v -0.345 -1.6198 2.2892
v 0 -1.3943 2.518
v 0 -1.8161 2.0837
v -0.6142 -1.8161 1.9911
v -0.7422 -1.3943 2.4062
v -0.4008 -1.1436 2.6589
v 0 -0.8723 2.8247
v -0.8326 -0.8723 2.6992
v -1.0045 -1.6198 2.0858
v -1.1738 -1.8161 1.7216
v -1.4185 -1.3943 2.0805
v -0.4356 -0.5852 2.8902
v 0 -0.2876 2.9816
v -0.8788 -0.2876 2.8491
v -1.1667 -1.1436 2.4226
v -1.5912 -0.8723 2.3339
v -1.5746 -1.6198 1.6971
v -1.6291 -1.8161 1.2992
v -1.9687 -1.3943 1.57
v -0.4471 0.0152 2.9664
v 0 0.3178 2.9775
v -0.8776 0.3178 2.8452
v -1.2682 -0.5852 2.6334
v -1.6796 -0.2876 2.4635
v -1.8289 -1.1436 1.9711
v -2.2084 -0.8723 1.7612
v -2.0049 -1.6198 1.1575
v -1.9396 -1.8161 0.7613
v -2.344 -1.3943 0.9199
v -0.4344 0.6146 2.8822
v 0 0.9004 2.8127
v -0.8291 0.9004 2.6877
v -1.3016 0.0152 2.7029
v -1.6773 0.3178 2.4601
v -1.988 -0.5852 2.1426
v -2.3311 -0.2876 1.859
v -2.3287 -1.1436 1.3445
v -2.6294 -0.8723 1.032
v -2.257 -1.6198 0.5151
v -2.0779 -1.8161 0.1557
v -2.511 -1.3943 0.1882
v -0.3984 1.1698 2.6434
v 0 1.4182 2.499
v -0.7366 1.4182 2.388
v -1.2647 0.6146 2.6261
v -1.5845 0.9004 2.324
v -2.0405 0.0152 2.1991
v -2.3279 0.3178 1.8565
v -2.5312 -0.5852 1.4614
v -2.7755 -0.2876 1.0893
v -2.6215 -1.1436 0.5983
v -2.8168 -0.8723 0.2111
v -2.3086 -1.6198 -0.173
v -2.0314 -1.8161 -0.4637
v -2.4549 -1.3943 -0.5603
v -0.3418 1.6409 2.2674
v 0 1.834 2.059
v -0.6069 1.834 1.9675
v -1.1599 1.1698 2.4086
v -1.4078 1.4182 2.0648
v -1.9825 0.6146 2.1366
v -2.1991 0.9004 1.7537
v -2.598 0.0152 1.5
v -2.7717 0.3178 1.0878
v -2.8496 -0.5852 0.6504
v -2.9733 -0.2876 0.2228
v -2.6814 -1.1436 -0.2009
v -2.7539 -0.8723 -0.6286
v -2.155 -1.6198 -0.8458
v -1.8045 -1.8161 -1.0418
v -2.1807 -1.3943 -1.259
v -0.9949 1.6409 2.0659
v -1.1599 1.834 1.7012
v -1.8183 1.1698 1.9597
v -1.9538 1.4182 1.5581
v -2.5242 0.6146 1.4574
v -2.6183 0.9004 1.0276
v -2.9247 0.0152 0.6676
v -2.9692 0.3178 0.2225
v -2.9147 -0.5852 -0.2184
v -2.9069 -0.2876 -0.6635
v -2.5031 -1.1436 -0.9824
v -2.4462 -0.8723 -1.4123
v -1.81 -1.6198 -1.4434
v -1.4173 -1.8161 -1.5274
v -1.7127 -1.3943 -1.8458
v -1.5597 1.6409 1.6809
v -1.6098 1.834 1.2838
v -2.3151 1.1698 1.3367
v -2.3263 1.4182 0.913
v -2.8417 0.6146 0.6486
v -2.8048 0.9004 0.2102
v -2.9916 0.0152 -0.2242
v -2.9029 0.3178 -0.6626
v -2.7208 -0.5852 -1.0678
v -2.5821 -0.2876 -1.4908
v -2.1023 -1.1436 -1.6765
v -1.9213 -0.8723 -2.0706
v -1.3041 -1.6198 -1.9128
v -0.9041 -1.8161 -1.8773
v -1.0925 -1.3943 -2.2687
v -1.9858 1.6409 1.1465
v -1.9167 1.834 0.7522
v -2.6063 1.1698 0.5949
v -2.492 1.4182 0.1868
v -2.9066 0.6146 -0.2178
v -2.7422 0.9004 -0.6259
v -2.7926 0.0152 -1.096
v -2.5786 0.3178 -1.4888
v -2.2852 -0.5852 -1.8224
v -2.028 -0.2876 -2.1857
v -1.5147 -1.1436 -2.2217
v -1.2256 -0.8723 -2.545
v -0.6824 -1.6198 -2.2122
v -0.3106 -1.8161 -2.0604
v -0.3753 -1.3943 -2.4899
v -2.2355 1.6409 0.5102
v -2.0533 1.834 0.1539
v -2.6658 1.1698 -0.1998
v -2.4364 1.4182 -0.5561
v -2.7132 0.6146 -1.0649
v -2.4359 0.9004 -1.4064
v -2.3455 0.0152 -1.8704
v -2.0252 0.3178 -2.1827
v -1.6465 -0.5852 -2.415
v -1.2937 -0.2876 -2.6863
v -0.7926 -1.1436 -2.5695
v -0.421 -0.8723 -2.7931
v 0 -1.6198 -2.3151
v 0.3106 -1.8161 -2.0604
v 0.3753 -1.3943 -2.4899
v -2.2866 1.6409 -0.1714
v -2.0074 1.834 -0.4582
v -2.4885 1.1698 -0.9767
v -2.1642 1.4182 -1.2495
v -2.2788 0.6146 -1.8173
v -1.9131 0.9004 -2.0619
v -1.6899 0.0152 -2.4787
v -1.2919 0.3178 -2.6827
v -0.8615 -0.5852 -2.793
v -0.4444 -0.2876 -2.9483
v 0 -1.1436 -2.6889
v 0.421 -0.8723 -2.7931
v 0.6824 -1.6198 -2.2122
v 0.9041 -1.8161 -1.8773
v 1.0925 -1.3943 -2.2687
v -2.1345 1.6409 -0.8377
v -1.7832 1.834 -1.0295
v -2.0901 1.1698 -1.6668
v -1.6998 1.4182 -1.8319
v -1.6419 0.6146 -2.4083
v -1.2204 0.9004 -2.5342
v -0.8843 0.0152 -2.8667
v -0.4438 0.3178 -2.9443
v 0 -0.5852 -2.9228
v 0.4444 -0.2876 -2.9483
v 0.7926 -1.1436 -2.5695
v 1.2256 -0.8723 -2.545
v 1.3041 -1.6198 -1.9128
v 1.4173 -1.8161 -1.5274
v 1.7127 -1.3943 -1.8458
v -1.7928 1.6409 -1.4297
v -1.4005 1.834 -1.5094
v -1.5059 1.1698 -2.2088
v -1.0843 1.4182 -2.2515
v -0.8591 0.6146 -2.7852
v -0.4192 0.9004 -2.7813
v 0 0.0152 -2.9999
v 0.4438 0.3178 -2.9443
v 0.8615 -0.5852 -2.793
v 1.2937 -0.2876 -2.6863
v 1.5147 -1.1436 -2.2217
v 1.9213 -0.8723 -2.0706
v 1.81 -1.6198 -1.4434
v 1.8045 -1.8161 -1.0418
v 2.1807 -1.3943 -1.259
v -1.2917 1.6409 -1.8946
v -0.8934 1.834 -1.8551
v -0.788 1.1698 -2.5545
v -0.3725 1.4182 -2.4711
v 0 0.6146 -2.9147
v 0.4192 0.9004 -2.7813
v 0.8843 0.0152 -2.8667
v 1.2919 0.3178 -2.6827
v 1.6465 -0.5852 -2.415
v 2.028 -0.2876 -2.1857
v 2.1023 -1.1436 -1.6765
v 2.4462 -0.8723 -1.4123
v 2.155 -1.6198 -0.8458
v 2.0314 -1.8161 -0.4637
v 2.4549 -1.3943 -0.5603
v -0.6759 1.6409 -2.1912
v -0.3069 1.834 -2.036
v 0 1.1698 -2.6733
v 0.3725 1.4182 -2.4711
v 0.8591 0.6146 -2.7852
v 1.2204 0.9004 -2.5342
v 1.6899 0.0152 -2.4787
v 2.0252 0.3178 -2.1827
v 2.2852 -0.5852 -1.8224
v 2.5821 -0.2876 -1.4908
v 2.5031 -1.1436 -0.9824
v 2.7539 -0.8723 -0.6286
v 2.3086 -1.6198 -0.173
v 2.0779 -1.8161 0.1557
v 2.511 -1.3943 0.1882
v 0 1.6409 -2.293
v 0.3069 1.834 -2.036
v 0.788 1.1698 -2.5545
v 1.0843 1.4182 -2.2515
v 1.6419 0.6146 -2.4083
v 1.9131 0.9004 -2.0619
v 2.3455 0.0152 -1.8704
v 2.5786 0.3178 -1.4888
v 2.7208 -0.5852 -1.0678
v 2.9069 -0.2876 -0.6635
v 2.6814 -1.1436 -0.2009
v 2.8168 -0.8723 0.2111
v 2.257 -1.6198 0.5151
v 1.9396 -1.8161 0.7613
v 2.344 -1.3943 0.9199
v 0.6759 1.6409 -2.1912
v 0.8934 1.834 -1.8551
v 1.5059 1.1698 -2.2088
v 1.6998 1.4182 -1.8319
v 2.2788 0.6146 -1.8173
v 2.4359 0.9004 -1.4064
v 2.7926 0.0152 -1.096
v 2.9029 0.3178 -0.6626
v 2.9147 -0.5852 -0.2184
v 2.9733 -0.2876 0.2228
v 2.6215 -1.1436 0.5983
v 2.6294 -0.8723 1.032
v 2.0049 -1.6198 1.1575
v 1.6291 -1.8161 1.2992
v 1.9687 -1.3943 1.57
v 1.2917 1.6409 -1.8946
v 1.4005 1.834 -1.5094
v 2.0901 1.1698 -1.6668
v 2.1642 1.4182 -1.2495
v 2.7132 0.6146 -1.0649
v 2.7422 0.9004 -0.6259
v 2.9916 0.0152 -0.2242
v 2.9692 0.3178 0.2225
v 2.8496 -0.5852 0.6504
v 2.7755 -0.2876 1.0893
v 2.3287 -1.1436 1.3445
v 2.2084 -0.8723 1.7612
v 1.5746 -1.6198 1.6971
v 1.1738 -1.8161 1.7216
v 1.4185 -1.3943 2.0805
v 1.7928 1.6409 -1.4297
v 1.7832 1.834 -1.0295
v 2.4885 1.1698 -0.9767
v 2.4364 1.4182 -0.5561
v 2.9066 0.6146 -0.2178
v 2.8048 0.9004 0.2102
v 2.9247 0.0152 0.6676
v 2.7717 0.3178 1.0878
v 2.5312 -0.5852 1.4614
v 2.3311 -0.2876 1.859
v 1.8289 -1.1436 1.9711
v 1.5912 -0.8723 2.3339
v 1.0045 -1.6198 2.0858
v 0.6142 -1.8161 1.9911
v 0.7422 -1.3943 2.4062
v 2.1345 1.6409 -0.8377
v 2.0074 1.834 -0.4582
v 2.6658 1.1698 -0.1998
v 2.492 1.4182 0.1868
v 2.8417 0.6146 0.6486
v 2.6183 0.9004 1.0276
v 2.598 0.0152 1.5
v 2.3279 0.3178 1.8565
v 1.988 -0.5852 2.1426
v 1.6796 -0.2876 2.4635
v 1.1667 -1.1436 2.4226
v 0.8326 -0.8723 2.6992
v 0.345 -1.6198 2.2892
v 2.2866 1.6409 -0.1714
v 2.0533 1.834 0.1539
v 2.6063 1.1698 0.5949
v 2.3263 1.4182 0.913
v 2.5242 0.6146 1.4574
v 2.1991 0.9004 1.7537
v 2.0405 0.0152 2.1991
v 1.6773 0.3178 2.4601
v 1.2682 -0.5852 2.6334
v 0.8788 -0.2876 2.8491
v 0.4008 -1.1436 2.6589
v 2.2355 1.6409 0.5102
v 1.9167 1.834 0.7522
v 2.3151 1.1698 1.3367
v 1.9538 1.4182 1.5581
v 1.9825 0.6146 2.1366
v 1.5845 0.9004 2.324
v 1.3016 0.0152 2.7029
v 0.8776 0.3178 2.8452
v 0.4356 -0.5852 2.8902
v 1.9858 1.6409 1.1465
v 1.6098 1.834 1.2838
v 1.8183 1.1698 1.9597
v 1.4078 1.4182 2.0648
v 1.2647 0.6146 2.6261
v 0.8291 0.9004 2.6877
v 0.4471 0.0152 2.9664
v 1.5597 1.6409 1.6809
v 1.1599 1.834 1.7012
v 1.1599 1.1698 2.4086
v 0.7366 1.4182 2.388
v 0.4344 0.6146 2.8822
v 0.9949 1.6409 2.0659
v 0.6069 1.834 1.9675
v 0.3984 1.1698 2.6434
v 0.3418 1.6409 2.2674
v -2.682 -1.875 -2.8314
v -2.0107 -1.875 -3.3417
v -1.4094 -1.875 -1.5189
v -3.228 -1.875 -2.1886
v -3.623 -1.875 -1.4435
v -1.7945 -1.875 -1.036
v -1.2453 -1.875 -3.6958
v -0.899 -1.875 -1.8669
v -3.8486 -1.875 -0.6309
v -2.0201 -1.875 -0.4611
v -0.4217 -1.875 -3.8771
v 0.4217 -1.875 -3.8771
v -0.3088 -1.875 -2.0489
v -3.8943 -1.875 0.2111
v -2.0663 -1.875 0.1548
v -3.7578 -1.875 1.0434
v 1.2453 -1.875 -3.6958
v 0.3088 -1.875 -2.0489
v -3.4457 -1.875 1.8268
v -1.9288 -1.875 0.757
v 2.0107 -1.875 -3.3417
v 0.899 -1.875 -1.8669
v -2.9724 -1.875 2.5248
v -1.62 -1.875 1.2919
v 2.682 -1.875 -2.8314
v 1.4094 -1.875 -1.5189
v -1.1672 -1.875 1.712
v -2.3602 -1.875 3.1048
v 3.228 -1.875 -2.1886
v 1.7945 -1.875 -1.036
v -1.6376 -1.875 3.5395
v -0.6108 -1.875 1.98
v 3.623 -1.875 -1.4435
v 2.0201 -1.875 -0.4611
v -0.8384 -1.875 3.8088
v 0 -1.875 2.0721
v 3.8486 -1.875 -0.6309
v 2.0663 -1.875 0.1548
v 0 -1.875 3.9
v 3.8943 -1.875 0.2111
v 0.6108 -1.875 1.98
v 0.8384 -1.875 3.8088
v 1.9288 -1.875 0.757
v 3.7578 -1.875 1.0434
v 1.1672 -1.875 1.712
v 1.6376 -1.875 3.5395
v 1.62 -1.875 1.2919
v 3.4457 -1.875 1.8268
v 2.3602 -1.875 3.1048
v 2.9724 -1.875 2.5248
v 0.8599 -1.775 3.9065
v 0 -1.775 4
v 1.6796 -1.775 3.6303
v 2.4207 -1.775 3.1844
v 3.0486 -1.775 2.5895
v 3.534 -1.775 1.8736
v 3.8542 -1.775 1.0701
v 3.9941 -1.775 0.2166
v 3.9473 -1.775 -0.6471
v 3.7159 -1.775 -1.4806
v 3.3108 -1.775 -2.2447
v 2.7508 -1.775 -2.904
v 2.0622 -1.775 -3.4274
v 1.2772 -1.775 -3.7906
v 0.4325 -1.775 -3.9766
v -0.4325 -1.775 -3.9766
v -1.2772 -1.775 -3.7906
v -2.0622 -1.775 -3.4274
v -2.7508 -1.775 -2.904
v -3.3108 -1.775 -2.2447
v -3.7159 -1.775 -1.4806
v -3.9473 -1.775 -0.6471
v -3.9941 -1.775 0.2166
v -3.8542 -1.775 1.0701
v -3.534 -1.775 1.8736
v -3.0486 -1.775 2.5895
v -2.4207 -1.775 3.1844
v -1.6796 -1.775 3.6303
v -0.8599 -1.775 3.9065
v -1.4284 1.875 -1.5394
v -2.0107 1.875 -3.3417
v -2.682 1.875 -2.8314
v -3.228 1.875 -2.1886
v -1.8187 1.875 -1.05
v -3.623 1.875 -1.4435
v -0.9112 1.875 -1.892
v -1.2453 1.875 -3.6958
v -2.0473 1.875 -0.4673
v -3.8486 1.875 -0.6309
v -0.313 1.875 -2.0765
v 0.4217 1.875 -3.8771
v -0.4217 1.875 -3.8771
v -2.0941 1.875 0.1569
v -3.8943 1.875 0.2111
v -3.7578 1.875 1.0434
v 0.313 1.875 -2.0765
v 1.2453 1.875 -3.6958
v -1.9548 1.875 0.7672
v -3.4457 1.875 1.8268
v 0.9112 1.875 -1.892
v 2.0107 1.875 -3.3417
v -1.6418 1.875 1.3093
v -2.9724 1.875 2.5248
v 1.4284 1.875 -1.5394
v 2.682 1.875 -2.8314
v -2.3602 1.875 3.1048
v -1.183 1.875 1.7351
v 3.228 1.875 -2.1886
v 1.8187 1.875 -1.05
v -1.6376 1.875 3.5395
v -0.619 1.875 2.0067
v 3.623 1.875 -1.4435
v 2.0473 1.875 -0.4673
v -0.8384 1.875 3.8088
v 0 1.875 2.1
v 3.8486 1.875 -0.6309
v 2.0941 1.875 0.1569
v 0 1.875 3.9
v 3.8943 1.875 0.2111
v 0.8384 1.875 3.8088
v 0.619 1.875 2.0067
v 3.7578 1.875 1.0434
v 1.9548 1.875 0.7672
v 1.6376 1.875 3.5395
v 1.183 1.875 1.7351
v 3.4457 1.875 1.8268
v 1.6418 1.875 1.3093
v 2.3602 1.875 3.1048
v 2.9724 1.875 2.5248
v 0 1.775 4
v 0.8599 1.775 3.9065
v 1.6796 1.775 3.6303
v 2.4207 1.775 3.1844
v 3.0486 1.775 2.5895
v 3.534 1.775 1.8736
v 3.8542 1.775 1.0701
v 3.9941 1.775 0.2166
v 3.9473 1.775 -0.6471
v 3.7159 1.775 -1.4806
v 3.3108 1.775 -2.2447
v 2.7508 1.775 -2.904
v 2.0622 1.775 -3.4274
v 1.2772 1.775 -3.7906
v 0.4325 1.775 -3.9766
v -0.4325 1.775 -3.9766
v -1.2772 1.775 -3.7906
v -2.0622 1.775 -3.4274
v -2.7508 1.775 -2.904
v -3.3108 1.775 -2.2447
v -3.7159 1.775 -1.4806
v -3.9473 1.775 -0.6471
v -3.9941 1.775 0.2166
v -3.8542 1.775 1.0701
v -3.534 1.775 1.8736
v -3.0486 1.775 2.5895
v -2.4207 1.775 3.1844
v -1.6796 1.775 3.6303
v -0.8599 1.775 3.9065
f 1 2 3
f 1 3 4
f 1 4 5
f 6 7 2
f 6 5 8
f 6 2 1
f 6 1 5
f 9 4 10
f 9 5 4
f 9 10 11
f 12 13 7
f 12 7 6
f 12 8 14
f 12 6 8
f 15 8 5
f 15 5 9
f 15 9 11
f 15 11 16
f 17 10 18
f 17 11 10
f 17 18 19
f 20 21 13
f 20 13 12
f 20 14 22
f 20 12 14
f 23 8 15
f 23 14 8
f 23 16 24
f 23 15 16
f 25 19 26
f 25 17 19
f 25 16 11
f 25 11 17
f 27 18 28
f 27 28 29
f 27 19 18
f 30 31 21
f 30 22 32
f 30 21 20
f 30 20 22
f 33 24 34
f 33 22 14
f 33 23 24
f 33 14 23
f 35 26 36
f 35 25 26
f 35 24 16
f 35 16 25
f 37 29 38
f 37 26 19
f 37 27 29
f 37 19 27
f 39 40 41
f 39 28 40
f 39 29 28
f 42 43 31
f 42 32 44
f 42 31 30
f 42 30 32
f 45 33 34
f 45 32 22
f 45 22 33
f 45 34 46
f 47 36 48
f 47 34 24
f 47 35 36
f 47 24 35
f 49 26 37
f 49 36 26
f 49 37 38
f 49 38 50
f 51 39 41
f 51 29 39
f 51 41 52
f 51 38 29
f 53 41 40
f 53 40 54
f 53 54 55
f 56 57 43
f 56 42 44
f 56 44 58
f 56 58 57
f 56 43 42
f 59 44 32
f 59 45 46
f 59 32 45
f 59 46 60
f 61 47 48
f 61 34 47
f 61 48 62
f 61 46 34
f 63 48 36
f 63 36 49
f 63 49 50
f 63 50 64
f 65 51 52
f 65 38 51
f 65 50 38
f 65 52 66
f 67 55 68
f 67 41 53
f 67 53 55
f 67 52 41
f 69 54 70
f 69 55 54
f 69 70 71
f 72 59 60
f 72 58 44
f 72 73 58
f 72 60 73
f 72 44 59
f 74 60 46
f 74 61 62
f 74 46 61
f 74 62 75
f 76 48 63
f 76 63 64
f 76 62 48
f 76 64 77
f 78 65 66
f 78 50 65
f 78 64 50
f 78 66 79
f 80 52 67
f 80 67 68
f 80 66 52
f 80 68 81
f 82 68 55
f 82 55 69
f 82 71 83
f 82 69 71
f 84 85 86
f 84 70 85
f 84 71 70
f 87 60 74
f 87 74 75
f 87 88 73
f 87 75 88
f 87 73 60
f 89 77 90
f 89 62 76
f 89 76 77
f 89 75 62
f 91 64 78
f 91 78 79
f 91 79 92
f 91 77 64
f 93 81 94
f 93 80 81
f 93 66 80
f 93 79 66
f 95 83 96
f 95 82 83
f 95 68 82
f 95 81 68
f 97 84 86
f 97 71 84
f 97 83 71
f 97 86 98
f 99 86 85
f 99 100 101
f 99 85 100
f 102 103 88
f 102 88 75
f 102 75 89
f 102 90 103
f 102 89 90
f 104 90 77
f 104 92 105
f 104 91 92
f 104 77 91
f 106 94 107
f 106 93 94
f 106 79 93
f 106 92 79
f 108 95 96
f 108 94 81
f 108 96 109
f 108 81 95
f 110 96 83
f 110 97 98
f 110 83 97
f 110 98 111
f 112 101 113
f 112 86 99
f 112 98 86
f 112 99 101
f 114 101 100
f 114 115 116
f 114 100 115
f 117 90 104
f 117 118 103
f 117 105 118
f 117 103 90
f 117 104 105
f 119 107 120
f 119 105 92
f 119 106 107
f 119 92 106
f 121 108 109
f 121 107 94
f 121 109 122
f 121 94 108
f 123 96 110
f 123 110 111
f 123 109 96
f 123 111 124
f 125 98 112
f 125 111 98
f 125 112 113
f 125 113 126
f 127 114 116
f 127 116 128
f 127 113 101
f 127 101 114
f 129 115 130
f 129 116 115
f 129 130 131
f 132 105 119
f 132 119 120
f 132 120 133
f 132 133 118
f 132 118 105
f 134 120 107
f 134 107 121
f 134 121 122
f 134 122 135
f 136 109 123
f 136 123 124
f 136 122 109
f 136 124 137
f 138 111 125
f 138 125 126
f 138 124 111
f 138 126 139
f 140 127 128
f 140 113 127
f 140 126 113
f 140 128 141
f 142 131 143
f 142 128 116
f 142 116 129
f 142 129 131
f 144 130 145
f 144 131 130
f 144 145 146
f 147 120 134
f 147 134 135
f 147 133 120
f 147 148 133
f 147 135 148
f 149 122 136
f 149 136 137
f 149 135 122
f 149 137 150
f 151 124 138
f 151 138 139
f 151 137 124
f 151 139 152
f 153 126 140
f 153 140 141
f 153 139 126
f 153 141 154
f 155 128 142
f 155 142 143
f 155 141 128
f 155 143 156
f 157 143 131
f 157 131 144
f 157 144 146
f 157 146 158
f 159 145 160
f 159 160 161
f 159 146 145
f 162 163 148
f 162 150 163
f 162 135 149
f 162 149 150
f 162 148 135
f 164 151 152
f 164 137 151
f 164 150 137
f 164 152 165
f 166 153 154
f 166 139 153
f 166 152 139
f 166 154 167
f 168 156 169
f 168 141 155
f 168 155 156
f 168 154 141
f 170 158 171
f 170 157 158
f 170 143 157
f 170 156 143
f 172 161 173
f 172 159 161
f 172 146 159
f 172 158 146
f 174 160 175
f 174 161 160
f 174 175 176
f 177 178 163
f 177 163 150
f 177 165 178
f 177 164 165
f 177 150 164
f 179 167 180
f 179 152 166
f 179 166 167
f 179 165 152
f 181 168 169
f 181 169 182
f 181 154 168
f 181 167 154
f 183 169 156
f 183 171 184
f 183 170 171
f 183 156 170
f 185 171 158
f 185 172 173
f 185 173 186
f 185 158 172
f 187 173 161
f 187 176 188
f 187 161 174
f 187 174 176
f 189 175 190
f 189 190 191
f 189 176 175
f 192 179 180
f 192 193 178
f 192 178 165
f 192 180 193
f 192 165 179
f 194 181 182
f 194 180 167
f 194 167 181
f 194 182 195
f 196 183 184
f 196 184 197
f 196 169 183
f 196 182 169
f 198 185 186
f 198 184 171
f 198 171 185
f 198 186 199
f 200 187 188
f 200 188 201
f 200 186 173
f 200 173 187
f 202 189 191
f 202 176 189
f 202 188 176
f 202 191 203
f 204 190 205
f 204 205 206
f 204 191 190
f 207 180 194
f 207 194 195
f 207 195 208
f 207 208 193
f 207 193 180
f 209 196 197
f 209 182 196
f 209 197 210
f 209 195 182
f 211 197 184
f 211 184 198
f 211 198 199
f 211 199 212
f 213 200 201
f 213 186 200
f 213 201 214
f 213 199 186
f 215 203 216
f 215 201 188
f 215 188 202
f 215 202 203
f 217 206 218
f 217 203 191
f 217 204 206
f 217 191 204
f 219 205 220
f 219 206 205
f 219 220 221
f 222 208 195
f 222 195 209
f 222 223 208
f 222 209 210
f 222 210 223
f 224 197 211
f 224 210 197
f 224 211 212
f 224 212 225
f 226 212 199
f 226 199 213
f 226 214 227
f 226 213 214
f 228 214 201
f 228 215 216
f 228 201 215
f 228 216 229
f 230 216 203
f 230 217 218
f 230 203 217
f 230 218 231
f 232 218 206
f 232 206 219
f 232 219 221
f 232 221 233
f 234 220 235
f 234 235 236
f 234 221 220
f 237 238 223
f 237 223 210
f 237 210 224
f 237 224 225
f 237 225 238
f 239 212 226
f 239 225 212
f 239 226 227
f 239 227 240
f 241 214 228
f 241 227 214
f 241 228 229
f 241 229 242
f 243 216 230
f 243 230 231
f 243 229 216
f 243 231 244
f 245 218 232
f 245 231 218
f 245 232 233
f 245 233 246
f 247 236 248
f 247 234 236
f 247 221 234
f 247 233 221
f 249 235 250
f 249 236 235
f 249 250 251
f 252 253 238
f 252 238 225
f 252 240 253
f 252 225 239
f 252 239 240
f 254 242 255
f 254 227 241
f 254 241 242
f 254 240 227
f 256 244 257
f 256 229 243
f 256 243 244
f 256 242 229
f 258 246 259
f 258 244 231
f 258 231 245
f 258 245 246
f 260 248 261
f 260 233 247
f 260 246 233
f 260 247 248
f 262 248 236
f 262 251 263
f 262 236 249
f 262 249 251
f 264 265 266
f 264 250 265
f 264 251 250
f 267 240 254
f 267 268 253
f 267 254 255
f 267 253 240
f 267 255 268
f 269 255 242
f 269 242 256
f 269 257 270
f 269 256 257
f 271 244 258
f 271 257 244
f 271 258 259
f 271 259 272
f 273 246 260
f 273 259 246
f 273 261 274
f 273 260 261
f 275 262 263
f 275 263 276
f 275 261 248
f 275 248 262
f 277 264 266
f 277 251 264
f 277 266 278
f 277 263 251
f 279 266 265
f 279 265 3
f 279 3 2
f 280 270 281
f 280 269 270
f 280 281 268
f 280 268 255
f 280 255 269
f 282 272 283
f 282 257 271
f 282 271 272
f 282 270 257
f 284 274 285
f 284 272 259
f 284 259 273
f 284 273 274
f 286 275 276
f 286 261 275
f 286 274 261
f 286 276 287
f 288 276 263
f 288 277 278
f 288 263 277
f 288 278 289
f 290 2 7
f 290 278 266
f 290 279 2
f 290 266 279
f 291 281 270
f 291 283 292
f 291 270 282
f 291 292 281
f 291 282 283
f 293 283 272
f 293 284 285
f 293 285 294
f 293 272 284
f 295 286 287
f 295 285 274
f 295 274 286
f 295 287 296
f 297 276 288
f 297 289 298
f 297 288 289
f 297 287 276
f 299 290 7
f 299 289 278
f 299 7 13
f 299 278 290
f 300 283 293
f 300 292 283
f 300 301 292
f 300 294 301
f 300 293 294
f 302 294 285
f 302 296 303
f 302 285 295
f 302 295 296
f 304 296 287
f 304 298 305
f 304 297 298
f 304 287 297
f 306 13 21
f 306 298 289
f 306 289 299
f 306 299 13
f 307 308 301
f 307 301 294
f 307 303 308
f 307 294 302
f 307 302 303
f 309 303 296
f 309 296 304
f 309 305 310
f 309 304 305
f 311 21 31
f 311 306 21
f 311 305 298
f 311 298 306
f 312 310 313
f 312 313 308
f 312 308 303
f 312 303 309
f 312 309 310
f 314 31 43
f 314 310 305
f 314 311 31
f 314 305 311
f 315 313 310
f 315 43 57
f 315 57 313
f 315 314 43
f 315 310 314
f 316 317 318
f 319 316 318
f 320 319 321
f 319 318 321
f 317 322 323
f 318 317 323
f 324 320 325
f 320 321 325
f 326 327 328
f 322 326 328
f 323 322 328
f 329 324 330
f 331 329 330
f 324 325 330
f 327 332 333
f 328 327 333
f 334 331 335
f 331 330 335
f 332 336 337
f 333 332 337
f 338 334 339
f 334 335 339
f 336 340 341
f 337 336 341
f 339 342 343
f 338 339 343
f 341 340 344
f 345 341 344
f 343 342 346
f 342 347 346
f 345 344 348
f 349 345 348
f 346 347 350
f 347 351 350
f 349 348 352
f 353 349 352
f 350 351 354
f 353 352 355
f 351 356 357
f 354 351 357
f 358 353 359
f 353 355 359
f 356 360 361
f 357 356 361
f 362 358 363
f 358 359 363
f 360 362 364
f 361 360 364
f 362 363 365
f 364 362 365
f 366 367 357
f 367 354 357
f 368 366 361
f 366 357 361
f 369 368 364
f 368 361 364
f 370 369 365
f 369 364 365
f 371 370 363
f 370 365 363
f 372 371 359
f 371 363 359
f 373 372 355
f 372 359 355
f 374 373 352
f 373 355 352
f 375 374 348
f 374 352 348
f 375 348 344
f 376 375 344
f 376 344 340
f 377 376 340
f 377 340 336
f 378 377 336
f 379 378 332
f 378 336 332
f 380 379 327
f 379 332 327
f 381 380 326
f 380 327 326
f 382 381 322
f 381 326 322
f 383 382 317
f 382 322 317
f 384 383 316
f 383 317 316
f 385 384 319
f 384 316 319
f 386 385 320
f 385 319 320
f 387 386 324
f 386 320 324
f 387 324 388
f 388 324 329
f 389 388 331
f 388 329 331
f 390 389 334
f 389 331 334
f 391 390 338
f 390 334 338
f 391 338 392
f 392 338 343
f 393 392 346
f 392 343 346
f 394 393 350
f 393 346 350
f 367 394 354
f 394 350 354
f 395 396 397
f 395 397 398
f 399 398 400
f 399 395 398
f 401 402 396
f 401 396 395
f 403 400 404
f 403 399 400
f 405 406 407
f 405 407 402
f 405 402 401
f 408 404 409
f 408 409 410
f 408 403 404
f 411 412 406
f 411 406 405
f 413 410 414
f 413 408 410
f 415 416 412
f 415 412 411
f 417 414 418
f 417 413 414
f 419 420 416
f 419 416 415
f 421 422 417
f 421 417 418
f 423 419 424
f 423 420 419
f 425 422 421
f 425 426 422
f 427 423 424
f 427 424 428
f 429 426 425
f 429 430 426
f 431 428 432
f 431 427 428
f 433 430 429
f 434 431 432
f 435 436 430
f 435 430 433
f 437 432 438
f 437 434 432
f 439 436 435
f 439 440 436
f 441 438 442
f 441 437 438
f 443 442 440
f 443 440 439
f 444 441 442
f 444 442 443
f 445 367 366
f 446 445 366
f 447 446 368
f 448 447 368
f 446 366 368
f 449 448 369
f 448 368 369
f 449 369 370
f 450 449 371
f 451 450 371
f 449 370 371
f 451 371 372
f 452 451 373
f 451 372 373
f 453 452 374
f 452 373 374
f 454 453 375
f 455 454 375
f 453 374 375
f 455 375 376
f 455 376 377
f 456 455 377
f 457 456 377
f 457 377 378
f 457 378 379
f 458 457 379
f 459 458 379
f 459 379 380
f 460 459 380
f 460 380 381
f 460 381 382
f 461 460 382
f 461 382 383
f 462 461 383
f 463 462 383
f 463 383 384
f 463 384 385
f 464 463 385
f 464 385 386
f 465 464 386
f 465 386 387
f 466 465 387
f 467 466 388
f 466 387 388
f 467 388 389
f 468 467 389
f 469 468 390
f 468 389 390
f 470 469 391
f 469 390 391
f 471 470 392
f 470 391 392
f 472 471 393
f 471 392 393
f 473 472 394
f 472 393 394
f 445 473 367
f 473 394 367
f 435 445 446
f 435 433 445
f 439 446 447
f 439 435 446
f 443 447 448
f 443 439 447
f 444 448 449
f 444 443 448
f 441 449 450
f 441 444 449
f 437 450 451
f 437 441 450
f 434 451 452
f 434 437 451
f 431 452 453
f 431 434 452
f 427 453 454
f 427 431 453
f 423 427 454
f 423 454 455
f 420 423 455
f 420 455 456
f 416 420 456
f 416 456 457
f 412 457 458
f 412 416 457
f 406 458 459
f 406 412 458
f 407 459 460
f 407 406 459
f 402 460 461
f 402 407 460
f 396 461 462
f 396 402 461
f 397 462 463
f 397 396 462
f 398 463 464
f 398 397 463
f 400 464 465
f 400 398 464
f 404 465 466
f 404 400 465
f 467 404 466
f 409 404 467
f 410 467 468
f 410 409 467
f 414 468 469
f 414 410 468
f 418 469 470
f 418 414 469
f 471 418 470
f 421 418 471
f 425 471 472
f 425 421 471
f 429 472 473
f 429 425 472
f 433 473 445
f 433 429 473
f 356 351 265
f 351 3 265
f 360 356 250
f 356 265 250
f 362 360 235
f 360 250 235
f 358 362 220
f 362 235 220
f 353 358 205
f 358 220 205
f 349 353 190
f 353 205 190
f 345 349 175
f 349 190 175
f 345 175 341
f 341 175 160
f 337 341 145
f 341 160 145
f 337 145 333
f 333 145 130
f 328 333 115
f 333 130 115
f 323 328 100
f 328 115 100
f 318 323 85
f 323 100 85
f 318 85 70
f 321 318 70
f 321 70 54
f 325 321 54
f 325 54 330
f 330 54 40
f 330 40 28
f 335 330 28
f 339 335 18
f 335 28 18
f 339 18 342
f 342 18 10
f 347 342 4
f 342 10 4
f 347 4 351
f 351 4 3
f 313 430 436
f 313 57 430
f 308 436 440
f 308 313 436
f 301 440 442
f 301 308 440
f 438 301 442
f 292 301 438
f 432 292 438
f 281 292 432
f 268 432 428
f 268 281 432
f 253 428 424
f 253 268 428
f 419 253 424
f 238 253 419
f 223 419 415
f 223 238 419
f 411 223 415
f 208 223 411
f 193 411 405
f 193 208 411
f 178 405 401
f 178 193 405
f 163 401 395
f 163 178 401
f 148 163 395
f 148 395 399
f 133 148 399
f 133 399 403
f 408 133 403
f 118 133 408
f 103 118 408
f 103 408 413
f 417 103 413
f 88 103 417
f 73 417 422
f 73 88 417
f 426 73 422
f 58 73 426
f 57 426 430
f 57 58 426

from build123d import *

# Parameters (mm, degrees)
BOSS_EXTRUDE1_DEPTH      = 1.875
BOSS_EXTRUDE1_DEPTH_BACK = 1.875
SKETCH1_R                = 4
SKETCH1_R_2              = 2
CHAMFER1_SIZE            = 0.072069825
CHAMFER1_SIZE_2          = 0.1


with BuildPart() as part:
    # Sketch1 → Boss-Extrude1 (new, two sides: drawn at the far end of the back side and taken through both)
    with BuildSketch(Plane(origin=(0, 0, 0), x_dir=(1, 0, 0), z_dir=(0, 1, 0)).offset(-BOSS_EXTRUDE1_DEPTH_BACK)):
        with Locations(Location((0, 0, 0), (0, 0, 270))):
            Circle(SKETCH1_R)
        with Locations(Location((0, 0, 0), (0, 0, 270))):
            Circle(SKETCH1_R_2, mode=Mode.SUBTRACT)
    extrude(amount=BOSS_EXTRUDE1_DEPTH + BOSS_EXTRUDE1_DEPTH_BACK)

    # Sketch3 → Cut-Revolve1 (revolve, cut)
    with BuildSketch(Plane(origin=(0, 0, 0), x_dir=(0, 0, -1), z_dir=(1, 0, 0))):
        with BuildLine():
            Line((-2, 1.875), (-2, -1.875))
            ThreePointArc((-2, -1.875), (-3, 0), (-2, 1.875))
        make_face()
    revolve(axis=Axis((0, 0, 0), (0, -1, 0)), mode=Mode.SUBTRACT)

    # Chamfer1
    # the kernel refuses this chamfer: 0.1, 0.072069825 mm, written as the material it takes off along each edge
    with BuildSketch(Plane(origin=(0, -1.875, 0), x_dir=(0, 0, 1), z_dir=(-1, 0, 0))) as chamfer1_piece_1:
        with BuildLine():
            Line((2 + CHAMFER1_SIZE * 1.00000000606, 0), (2.083679075, 0.058927964))
            ThreePointArc((2.083679075, 0.058927964), (2.043356425, 0.029823392), (2, 0))
            Line((2, 0), (2 + CHAMFER1_SIZE * 1.00000000606, 0))
        make_face()
    revolve(axis=Axis((0, -1.875, 0), (0, 1, 0)), mode=Mode.SUBTRACT)
    with BuildSketch(Plane(origin=(0, 1.875, 0), x_dir=(0, 0, 1), z_dir=(-1, 0, 0))) as chamfer1_piece_2:
        with BuildLine():
            Line((2 + CHAMFER1_SIZE_2, 0), (2.059026362, -0.040973638))
            ThreePointArc((2.059026362, -0.040973638), (2.029383998, -0.020049203), (2, 0))
            Line((2, 0), (2 + CHAMFER1_SIZE_2, 0))
        make_face()
    revolve(axis=Axis((0, 1.875, 0), (0, 1, 0)), mode=Mode.SUBTRACT)
    with BuildSketch(Plane(origin=(0, -1.875, 0), x_dir=(0, 0, 1), z_dir=(-1, 0, 0))) as chamfer1_piece_3:
        Polygon((4, CHAMFER1_SIZE_2), (4 - CHAMFER1_SIZE_2, 0), (4, 0), align=None)
    revolve(axis=Axis((0, -1.875, 0), (0, 1, 0)), mode=Mode.SUBTRACT)
    with BuildSketch(Plane(origin=(0, 1.875, 0), x_dir=(0, 0, 1), z_dir=(-1, 0, 0))) as chamfer1_piece_4:
        Polygon((4, -CHAMFER1_SIZE_2), (4 - CHAMFER1_SIZE_2, 0), (4, 0), align=None)
    revolve(axis=Axis((0, 1.875, 0), (0, 1, 0)), mode=Mode.SUBTRACT)


solid = part.part
